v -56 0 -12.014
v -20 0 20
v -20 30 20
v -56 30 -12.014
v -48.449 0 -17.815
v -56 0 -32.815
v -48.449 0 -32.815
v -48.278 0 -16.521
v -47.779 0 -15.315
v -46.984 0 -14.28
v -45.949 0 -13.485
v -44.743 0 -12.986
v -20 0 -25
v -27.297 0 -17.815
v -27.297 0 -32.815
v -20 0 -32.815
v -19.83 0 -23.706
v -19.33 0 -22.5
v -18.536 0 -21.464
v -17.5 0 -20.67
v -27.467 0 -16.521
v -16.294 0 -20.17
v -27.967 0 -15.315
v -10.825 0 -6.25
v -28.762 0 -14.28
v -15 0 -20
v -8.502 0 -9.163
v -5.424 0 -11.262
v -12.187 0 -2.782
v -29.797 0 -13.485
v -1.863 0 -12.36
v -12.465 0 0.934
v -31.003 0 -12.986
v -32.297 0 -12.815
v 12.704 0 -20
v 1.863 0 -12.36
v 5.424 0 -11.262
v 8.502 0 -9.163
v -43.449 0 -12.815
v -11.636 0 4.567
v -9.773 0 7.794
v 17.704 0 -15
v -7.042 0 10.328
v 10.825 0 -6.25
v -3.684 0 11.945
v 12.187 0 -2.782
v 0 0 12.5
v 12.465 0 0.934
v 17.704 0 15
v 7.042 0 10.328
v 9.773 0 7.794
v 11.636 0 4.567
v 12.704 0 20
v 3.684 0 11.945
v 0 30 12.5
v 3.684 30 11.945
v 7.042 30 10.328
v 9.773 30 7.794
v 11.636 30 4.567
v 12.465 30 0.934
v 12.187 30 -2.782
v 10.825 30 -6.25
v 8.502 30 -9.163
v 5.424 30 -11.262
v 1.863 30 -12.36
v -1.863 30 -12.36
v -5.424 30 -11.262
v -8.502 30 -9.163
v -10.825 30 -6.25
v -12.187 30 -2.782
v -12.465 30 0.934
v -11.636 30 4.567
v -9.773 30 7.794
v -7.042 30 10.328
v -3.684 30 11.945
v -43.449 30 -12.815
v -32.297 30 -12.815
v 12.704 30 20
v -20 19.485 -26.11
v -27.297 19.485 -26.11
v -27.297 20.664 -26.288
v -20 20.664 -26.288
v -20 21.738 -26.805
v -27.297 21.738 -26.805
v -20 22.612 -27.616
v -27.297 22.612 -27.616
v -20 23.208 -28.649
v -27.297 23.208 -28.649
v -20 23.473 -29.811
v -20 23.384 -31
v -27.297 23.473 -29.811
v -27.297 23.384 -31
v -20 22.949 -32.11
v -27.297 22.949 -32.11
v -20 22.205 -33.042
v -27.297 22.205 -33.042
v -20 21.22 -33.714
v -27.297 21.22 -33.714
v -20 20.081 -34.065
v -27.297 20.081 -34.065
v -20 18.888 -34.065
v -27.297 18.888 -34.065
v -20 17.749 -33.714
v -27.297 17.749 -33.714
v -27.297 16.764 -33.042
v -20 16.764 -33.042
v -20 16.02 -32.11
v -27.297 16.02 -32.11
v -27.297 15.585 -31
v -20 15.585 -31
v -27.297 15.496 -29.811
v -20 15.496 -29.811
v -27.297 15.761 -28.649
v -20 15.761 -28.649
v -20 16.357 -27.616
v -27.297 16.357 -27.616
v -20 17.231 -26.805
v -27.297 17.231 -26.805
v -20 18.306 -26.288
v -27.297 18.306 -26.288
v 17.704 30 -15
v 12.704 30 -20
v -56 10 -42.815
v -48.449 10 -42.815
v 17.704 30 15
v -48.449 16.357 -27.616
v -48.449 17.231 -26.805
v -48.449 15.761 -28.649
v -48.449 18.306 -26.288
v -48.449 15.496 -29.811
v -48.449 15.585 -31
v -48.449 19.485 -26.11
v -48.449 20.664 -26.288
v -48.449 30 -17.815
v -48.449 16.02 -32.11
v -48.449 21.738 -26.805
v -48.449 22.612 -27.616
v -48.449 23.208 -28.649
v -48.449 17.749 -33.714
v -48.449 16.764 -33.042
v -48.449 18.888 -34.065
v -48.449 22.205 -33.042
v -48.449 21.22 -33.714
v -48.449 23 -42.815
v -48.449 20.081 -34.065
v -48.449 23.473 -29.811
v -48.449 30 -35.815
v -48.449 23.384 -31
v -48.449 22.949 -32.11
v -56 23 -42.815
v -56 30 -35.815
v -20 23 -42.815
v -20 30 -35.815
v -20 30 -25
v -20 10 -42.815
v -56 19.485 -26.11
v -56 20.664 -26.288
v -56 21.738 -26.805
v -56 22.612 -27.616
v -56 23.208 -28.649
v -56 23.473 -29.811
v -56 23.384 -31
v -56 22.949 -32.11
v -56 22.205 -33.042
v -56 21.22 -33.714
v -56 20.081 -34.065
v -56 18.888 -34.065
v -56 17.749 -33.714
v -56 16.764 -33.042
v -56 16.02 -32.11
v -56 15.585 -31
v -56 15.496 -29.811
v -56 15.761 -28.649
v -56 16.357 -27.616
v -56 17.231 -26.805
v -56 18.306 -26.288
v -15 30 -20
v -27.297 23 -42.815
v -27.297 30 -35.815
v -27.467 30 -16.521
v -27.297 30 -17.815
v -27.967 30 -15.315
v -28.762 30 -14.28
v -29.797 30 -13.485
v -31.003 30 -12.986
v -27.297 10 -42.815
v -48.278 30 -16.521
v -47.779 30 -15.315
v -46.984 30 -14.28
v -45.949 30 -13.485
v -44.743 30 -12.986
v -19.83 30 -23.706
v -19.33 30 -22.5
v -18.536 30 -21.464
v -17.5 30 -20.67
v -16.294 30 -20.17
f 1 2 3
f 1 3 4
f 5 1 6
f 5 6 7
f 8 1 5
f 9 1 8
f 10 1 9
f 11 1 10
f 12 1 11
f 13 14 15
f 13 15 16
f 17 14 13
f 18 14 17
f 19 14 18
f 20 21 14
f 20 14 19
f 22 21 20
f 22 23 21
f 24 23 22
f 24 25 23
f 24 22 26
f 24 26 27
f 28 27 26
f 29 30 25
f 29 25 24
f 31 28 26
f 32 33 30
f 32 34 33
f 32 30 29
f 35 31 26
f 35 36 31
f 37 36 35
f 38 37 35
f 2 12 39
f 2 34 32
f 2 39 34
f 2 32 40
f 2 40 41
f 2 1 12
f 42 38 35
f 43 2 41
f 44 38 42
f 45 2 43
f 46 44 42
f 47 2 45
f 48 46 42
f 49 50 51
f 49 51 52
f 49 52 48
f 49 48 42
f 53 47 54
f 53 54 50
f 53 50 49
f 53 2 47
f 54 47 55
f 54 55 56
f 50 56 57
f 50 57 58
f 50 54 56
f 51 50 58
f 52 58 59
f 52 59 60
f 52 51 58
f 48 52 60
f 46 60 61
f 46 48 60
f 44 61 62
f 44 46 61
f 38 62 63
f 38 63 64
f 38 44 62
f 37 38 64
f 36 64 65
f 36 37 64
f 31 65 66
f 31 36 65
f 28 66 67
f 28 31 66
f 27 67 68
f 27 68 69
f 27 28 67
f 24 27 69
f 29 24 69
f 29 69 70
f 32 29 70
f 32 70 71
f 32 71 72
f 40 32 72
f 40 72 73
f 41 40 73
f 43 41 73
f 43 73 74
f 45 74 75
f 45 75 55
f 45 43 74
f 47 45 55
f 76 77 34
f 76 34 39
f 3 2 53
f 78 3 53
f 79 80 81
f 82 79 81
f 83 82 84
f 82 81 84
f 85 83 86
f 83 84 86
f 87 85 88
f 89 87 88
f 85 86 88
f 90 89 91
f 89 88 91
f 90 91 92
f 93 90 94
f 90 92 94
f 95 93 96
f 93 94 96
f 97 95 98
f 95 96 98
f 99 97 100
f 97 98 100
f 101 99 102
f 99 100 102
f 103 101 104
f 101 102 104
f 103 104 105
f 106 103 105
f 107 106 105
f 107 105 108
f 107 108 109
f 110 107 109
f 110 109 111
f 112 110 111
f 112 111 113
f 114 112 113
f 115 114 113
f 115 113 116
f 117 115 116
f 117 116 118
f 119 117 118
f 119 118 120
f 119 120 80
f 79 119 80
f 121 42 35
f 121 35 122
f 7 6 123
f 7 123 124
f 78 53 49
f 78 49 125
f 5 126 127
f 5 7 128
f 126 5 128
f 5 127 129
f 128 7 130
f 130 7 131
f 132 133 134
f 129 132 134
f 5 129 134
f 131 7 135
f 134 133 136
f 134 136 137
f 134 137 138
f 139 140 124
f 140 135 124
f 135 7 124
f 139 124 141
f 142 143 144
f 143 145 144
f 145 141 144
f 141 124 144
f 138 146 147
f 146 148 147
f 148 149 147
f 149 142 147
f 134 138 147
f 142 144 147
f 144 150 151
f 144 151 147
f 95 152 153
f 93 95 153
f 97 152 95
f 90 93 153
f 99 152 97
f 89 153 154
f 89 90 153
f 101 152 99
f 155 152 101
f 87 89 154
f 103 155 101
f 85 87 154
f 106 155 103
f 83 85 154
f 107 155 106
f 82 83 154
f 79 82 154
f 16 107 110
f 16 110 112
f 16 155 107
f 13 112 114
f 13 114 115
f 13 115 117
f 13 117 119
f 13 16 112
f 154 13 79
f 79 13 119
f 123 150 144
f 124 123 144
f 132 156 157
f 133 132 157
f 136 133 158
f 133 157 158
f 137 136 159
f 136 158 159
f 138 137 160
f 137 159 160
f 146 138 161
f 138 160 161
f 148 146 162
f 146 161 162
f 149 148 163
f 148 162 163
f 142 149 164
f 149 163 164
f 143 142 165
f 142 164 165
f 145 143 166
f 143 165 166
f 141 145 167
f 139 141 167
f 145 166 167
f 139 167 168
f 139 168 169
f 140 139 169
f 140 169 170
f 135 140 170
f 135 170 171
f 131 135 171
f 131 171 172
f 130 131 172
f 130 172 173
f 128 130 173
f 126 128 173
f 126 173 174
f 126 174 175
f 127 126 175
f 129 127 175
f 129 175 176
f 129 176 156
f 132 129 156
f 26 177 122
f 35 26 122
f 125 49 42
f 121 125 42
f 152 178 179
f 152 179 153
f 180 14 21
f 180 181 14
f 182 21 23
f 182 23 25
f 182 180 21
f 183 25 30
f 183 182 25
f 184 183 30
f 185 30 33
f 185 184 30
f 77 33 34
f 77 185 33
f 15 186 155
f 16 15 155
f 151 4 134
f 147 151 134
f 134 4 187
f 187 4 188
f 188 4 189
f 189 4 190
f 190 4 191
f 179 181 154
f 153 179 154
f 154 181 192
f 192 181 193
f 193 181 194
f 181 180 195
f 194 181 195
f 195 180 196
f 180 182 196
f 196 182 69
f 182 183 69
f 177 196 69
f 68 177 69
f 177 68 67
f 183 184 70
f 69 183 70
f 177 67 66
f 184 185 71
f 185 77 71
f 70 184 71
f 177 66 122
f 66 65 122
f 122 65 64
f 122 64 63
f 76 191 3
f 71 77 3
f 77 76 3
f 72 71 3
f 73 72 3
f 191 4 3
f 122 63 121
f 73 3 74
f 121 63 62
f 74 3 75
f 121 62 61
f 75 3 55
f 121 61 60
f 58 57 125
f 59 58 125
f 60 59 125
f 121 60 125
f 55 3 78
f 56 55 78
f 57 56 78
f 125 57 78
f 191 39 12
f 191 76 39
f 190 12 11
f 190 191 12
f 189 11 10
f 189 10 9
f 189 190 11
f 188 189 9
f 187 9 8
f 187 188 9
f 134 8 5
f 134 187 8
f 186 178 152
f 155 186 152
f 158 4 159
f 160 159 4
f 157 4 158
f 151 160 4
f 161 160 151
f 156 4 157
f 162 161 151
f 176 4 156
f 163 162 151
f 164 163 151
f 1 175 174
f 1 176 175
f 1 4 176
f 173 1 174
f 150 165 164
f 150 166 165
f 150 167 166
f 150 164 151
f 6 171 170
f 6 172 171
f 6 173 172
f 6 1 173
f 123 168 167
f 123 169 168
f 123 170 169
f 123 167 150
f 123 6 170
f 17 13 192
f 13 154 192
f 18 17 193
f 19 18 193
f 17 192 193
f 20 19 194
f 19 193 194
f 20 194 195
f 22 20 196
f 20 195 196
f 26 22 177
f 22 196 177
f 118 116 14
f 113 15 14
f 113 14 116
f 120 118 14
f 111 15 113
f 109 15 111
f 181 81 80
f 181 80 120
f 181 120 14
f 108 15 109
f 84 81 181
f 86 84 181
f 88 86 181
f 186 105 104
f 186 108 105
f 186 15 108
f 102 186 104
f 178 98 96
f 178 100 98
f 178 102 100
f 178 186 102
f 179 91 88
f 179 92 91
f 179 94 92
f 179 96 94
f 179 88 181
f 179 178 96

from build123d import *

# Parameters (mm, degrees)
SKETCH_1_W          = 37.703662968
SKETCH_1_H          = 40
SKETCH_1_R          = 12.5
EXTRUDE_1_DEPTH     = 30
EXTRUDE_3_DEPTH     = 30
SKETCH_9_W          = 21.151556031
SKETCH_9_H          = 33.5604842
CUT_EXTRUDE_5_DEPTH = 30
FILLET_4_R          = 5
CHAMFER_4_SIZE      = 7
FILLET_5_R          = 5
SKETCH_10_R         = 4.000000001
CUT_EXTRUDE_6_DEPTH = 91.362494631
CHAMFER_6_SIZE      = 10
CHAMFER_7_SIZE      = 5


with BuildPart() as part:
    # Эскиз1 → Вытянуть1 (new body)
    with BuildSketch(Plane(origin=(0, 0, 0), x_dir=(1, 0, 0), z_dir=(0, 1, 0))):
        with Locations((-1.148168516, 0)):
            Rectangle(SKETCH_1_W, SKETCH_1_H)
        with Locations(Location((0, 0, 0), (0, 0, 270))):
            Circle(SKETCH_1_R, mode=Mode.SUBTRACT)
    extrude(amount=EXTRUDE_1_DEPTH)

    # Эскиз8 → Вытянуть3 (add)
    with BuildSketch(Plane.XZ):
        Polygon((-20, 20), (-56, -12.013671604), (-56, -42.815306854), (-20, -42.815306854), align=None)
    extrude(amount=-EXTRUDE_3_DEPTH)

    # Эскиз9 → Вырез-Вытянуть5 (cut)
    with BuildSketch(Plane(origin=(0, 0, -42.815306854), x_dir=(-1, 0, 0), z_dir=(0, 0, -1))):
        with Locations((37.872859834, 13.650165161)):
            Rectangle(SKETCH_9_W, SKETCH_9_H)
    extrude(amount=-CUT_EXTRUDE_5_DEPTH, mode=Mode.SUBTRACT)

    # Скругление4
    fillet_4_edges = [part.edges().sort_by_distance(p)[0] for p in [
        (-27.297081818, 15, -12.815306854),
        (-48.448637849, 15, -12.815306854),
    ]]
    fillet(fillet_4_edges, radius=FILLET_4_R)

    # Фаска4
    chamfer_4_edges = [part.edges().sort_by_distance(p)[0] for p in [
        (-52.224318925, 30, -42.815306854),
        (-23.648540909, 30, -42.815306854),
    ]]
    chamfer(chamfer_4_edges, length=CHAMFER_4_SIZE)

    # Скругление5
    fillet_5_edges = [part.edges().sort_by_distance(p)[0] for p in [
        (-20, 15, -20),
    ]]
    fillet(fillet_5_edges, radius=FILLET_5_R)

    # Эскиз10 → Вырез-Вытянуть6 (cut, through all)
    with BuildSketch(Plane.ZY.offset(56)):
        with Locations((-30.109876722, 19.484541516)):
            Circle(SKETCH_10_R)
    extrude(amount=-CUT_EXTRUDE_6_DEPTH, mode=Mode.SUBTRACT)

    # Фаска6
    chamfer_6_edges = [part.edges().sort_by_distance(p)[0] for p in [
        (-23.648540909, 0, -42.815306854),
        (-52.224318925, 0, -42.815306854),
    ]]
    chamfer(chamfer_6_edges, length=CHAMFER_6_SIZE)

    # Фаска7
    chamfer_7_edges = [part.edges().sort_by_distance(p)[0] for p in [
        (17.703662968, 15, -20),
        (17.703662968, 15, 20),
    ]]
    chamfer(chamfer_7_edges, length=CHAMFER_7_SIZE)


solid = part.part
